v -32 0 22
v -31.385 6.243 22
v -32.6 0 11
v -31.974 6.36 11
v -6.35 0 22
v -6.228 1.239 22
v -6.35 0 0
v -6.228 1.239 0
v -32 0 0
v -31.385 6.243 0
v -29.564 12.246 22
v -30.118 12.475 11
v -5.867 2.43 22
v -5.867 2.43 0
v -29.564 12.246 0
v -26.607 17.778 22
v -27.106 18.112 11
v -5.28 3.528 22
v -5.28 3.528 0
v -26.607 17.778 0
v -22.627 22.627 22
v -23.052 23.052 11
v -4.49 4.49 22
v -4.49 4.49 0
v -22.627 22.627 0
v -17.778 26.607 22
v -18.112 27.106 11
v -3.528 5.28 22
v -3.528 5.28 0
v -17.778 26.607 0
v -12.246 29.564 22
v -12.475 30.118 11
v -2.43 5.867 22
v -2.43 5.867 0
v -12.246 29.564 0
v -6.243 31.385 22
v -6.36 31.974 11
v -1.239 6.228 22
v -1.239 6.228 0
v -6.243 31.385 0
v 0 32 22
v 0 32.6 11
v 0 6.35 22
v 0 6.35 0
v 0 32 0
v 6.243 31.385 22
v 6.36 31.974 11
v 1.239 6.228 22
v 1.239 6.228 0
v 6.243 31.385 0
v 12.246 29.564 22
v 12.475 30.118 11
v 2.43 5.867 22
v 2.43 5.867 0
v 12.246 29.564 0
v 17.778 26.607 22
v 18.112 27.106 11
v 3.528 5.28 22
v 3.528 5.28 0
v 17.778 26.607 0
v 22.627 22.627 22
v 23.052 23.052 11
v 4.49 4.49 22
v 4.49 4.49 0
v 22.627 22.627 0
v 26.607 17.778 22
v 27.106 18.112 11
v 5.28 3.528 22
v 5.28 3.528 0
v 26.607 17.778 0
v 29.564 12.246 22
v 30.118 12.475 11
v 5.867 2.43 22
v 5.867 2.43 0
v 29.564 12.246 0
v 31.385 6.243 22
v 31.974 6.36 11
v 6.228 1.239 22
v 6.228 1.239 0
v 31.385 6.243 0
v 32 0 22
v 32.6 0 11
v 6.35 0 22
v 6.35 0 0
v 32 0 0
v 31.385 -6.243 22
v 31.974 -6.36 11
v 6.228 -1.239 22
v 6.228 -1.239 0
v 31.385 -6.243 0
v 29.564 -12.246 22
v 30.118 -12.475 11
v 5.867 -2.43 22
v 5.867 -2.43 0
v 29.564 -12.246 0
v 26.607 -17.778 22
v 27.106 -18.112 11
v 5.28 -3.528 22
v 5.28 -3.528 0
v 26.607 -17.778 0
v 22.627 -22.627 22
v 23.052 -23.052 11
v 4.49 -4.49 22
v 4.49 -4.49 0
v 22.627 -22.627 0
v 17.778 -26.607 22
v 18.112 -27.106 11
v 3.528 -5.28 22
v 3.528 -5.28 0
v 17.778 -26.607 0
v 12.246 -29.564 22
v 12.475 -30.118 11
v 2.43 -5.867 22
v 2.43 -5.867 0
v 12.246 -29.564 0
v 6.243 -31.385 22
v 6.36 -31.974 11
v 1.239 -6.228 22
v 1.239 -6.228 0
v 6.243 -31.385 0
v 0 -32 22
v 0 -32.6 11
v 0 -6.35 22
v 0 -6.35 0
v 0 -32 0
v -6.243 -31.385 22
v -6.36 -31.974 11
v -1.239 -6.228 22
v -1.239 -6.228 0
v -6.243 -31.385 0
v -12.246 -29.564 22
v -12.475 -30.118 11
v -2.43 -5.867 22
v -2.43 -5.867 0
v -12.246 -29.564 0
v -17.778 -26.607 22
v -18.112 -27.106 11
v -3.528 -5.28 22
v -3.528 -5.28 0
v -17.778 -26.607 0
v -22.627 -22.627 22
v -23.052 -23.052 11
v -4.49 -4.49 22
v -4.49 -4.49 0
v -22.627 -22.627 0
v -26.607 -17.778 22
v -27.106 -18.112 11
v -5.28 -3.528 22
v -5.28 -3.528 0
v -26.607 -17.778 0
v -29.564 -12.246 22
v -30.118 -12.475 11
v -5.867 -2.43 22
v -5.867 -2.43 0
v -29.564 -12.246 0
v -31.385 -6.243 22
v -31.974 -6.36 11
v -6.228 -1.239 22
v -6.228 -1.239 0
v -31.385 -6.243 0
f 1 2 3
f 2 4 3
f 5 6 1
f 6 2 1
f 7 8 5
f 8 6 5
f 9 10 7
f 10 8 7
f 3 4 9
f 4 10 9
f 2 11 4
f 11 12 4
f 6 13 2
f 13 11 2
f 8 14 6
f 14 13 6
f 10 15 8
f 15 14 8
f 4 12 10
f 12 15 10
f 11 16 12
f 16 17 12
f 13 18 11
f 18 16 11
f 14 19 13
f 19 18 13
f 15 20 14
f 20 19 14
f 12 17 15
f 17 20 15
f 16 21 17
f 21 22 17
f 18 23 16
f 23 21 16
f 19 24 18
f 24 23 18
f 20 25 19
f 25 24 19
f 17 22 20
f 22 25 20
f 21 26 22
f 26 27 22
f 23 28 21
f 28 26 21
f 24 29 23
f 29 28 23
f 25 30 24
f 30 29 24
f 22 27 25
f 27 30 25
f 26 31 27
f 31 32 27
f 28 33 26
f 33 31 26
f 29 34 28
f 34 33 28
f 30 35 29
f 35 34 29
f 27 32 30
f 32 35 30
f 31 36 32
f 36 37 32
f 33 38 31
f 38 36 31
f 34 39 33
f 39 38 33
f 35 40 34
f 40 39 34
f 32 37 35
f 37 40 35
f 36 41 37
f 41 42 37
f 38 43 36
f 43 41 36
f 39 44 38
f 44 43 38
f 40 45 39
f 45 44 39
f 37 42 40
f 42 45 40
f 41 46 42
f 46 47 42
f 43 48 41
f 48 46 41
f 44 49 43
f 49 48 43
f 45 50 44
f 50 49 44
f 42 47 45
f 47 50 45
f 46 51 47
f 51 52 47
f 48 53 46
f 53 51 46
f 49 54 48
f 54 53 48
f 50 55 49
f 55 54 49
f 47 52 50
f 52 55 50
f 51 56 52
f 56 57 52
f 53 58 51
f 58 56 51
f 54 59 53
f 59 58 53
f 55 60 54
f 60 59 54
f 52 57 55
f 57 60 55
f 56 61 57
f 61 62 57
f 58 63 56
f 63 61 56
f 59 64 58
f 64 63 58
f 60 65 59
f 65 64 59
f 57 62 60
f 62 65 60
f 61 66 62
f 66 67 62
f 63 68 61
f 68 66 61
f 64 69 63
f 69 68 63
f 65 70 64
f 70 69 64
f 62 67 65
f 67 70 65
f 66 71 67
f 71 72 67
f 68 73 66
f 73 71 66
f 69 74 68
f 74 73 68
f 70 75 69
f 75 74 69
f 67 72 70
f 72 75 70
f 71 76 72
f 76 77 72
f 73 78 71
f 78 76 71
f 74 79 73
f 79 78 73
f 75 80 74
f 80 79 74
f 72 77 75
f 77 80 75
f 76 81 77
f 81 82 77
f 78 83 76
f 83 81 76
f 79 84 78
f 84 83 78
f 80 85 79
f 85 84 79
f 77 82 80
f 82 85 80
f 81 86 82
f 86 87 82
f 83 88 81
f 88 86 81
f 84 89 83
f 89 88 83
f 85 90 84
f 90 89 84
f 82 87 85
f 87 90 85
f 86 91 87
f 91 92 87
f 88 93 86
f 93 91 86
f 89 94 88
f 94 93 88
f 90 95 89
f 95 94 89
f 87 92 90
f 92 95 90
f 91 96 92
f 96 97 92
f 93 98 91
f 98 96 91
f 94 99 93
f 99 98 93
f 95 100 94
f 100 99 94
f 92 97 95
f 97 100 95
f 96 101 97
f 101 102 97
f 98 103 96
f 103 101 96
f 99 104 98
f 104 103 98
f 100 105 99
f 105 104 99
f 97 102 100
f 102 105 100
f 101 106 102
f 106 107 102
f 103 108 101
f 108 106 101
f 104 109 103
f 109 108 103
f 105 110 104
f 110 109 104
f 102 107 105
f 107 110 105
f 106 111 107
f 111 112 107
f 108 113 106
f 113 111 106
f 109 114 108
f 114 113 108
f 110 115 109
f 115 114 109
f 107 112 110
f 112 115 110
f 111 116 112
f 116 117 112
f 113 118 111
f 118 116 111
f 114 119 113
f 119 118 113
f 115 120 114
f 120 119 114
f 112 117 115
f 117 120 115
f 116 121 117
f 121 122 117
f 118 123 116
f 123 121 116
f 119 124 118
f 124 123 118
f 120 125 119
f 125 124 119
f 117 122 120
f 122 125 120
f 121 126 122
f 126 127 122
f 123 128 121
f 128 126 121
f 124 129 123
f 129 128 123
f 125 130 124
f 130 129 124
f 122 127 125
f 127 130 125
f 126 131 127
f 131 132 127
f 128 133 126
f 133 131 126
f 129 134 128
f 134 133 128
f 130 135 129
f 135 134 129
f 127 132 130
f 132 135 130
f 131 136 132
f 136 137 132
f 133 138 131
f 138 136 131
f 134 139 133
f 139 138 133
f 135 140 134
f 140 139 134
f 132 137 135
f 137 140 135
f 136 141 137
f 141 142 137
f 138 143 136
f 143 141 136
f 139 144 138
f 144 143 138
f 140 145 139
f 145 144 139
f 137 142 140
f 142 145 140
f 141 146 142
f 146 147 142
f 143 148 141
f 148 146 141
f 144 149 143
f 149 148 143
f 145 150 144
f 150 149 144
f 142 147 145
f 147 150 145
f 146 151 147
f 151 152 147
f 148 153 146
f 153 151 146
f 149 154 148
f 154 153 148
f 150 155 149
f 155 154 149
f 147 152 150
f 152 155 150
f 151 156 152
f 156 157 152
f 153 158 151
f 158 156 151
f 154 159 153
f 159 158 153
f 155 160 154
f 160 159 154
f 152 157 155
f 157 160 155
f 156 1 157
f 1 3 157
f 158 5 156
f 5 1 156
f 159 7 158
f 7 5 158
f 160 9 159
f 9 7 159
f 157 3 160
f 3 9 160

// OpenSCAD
$fn = 32;

// ----------------------------------------------------------------------
// Belt roller: 64 mm barrel, 22 mm wide, bore 12.7 mm
// ----------------------------------------------------------------------

// --- parameters (mm) ---
bore_d = 12.7;            // bore
barrel_d = 64;            // barrel diameter
roller_w = 22;            // roller width
crown = 0.6;              // crown height at mid width

roller_profile = [[6.35, 0], [32, 0], [32.6, 11], [32, 22], [6.35, 22]];

/* the profile stays clear of the axis, so the bore comes out of the revolve */
rotate_extrude() polygon(roller_profile);
